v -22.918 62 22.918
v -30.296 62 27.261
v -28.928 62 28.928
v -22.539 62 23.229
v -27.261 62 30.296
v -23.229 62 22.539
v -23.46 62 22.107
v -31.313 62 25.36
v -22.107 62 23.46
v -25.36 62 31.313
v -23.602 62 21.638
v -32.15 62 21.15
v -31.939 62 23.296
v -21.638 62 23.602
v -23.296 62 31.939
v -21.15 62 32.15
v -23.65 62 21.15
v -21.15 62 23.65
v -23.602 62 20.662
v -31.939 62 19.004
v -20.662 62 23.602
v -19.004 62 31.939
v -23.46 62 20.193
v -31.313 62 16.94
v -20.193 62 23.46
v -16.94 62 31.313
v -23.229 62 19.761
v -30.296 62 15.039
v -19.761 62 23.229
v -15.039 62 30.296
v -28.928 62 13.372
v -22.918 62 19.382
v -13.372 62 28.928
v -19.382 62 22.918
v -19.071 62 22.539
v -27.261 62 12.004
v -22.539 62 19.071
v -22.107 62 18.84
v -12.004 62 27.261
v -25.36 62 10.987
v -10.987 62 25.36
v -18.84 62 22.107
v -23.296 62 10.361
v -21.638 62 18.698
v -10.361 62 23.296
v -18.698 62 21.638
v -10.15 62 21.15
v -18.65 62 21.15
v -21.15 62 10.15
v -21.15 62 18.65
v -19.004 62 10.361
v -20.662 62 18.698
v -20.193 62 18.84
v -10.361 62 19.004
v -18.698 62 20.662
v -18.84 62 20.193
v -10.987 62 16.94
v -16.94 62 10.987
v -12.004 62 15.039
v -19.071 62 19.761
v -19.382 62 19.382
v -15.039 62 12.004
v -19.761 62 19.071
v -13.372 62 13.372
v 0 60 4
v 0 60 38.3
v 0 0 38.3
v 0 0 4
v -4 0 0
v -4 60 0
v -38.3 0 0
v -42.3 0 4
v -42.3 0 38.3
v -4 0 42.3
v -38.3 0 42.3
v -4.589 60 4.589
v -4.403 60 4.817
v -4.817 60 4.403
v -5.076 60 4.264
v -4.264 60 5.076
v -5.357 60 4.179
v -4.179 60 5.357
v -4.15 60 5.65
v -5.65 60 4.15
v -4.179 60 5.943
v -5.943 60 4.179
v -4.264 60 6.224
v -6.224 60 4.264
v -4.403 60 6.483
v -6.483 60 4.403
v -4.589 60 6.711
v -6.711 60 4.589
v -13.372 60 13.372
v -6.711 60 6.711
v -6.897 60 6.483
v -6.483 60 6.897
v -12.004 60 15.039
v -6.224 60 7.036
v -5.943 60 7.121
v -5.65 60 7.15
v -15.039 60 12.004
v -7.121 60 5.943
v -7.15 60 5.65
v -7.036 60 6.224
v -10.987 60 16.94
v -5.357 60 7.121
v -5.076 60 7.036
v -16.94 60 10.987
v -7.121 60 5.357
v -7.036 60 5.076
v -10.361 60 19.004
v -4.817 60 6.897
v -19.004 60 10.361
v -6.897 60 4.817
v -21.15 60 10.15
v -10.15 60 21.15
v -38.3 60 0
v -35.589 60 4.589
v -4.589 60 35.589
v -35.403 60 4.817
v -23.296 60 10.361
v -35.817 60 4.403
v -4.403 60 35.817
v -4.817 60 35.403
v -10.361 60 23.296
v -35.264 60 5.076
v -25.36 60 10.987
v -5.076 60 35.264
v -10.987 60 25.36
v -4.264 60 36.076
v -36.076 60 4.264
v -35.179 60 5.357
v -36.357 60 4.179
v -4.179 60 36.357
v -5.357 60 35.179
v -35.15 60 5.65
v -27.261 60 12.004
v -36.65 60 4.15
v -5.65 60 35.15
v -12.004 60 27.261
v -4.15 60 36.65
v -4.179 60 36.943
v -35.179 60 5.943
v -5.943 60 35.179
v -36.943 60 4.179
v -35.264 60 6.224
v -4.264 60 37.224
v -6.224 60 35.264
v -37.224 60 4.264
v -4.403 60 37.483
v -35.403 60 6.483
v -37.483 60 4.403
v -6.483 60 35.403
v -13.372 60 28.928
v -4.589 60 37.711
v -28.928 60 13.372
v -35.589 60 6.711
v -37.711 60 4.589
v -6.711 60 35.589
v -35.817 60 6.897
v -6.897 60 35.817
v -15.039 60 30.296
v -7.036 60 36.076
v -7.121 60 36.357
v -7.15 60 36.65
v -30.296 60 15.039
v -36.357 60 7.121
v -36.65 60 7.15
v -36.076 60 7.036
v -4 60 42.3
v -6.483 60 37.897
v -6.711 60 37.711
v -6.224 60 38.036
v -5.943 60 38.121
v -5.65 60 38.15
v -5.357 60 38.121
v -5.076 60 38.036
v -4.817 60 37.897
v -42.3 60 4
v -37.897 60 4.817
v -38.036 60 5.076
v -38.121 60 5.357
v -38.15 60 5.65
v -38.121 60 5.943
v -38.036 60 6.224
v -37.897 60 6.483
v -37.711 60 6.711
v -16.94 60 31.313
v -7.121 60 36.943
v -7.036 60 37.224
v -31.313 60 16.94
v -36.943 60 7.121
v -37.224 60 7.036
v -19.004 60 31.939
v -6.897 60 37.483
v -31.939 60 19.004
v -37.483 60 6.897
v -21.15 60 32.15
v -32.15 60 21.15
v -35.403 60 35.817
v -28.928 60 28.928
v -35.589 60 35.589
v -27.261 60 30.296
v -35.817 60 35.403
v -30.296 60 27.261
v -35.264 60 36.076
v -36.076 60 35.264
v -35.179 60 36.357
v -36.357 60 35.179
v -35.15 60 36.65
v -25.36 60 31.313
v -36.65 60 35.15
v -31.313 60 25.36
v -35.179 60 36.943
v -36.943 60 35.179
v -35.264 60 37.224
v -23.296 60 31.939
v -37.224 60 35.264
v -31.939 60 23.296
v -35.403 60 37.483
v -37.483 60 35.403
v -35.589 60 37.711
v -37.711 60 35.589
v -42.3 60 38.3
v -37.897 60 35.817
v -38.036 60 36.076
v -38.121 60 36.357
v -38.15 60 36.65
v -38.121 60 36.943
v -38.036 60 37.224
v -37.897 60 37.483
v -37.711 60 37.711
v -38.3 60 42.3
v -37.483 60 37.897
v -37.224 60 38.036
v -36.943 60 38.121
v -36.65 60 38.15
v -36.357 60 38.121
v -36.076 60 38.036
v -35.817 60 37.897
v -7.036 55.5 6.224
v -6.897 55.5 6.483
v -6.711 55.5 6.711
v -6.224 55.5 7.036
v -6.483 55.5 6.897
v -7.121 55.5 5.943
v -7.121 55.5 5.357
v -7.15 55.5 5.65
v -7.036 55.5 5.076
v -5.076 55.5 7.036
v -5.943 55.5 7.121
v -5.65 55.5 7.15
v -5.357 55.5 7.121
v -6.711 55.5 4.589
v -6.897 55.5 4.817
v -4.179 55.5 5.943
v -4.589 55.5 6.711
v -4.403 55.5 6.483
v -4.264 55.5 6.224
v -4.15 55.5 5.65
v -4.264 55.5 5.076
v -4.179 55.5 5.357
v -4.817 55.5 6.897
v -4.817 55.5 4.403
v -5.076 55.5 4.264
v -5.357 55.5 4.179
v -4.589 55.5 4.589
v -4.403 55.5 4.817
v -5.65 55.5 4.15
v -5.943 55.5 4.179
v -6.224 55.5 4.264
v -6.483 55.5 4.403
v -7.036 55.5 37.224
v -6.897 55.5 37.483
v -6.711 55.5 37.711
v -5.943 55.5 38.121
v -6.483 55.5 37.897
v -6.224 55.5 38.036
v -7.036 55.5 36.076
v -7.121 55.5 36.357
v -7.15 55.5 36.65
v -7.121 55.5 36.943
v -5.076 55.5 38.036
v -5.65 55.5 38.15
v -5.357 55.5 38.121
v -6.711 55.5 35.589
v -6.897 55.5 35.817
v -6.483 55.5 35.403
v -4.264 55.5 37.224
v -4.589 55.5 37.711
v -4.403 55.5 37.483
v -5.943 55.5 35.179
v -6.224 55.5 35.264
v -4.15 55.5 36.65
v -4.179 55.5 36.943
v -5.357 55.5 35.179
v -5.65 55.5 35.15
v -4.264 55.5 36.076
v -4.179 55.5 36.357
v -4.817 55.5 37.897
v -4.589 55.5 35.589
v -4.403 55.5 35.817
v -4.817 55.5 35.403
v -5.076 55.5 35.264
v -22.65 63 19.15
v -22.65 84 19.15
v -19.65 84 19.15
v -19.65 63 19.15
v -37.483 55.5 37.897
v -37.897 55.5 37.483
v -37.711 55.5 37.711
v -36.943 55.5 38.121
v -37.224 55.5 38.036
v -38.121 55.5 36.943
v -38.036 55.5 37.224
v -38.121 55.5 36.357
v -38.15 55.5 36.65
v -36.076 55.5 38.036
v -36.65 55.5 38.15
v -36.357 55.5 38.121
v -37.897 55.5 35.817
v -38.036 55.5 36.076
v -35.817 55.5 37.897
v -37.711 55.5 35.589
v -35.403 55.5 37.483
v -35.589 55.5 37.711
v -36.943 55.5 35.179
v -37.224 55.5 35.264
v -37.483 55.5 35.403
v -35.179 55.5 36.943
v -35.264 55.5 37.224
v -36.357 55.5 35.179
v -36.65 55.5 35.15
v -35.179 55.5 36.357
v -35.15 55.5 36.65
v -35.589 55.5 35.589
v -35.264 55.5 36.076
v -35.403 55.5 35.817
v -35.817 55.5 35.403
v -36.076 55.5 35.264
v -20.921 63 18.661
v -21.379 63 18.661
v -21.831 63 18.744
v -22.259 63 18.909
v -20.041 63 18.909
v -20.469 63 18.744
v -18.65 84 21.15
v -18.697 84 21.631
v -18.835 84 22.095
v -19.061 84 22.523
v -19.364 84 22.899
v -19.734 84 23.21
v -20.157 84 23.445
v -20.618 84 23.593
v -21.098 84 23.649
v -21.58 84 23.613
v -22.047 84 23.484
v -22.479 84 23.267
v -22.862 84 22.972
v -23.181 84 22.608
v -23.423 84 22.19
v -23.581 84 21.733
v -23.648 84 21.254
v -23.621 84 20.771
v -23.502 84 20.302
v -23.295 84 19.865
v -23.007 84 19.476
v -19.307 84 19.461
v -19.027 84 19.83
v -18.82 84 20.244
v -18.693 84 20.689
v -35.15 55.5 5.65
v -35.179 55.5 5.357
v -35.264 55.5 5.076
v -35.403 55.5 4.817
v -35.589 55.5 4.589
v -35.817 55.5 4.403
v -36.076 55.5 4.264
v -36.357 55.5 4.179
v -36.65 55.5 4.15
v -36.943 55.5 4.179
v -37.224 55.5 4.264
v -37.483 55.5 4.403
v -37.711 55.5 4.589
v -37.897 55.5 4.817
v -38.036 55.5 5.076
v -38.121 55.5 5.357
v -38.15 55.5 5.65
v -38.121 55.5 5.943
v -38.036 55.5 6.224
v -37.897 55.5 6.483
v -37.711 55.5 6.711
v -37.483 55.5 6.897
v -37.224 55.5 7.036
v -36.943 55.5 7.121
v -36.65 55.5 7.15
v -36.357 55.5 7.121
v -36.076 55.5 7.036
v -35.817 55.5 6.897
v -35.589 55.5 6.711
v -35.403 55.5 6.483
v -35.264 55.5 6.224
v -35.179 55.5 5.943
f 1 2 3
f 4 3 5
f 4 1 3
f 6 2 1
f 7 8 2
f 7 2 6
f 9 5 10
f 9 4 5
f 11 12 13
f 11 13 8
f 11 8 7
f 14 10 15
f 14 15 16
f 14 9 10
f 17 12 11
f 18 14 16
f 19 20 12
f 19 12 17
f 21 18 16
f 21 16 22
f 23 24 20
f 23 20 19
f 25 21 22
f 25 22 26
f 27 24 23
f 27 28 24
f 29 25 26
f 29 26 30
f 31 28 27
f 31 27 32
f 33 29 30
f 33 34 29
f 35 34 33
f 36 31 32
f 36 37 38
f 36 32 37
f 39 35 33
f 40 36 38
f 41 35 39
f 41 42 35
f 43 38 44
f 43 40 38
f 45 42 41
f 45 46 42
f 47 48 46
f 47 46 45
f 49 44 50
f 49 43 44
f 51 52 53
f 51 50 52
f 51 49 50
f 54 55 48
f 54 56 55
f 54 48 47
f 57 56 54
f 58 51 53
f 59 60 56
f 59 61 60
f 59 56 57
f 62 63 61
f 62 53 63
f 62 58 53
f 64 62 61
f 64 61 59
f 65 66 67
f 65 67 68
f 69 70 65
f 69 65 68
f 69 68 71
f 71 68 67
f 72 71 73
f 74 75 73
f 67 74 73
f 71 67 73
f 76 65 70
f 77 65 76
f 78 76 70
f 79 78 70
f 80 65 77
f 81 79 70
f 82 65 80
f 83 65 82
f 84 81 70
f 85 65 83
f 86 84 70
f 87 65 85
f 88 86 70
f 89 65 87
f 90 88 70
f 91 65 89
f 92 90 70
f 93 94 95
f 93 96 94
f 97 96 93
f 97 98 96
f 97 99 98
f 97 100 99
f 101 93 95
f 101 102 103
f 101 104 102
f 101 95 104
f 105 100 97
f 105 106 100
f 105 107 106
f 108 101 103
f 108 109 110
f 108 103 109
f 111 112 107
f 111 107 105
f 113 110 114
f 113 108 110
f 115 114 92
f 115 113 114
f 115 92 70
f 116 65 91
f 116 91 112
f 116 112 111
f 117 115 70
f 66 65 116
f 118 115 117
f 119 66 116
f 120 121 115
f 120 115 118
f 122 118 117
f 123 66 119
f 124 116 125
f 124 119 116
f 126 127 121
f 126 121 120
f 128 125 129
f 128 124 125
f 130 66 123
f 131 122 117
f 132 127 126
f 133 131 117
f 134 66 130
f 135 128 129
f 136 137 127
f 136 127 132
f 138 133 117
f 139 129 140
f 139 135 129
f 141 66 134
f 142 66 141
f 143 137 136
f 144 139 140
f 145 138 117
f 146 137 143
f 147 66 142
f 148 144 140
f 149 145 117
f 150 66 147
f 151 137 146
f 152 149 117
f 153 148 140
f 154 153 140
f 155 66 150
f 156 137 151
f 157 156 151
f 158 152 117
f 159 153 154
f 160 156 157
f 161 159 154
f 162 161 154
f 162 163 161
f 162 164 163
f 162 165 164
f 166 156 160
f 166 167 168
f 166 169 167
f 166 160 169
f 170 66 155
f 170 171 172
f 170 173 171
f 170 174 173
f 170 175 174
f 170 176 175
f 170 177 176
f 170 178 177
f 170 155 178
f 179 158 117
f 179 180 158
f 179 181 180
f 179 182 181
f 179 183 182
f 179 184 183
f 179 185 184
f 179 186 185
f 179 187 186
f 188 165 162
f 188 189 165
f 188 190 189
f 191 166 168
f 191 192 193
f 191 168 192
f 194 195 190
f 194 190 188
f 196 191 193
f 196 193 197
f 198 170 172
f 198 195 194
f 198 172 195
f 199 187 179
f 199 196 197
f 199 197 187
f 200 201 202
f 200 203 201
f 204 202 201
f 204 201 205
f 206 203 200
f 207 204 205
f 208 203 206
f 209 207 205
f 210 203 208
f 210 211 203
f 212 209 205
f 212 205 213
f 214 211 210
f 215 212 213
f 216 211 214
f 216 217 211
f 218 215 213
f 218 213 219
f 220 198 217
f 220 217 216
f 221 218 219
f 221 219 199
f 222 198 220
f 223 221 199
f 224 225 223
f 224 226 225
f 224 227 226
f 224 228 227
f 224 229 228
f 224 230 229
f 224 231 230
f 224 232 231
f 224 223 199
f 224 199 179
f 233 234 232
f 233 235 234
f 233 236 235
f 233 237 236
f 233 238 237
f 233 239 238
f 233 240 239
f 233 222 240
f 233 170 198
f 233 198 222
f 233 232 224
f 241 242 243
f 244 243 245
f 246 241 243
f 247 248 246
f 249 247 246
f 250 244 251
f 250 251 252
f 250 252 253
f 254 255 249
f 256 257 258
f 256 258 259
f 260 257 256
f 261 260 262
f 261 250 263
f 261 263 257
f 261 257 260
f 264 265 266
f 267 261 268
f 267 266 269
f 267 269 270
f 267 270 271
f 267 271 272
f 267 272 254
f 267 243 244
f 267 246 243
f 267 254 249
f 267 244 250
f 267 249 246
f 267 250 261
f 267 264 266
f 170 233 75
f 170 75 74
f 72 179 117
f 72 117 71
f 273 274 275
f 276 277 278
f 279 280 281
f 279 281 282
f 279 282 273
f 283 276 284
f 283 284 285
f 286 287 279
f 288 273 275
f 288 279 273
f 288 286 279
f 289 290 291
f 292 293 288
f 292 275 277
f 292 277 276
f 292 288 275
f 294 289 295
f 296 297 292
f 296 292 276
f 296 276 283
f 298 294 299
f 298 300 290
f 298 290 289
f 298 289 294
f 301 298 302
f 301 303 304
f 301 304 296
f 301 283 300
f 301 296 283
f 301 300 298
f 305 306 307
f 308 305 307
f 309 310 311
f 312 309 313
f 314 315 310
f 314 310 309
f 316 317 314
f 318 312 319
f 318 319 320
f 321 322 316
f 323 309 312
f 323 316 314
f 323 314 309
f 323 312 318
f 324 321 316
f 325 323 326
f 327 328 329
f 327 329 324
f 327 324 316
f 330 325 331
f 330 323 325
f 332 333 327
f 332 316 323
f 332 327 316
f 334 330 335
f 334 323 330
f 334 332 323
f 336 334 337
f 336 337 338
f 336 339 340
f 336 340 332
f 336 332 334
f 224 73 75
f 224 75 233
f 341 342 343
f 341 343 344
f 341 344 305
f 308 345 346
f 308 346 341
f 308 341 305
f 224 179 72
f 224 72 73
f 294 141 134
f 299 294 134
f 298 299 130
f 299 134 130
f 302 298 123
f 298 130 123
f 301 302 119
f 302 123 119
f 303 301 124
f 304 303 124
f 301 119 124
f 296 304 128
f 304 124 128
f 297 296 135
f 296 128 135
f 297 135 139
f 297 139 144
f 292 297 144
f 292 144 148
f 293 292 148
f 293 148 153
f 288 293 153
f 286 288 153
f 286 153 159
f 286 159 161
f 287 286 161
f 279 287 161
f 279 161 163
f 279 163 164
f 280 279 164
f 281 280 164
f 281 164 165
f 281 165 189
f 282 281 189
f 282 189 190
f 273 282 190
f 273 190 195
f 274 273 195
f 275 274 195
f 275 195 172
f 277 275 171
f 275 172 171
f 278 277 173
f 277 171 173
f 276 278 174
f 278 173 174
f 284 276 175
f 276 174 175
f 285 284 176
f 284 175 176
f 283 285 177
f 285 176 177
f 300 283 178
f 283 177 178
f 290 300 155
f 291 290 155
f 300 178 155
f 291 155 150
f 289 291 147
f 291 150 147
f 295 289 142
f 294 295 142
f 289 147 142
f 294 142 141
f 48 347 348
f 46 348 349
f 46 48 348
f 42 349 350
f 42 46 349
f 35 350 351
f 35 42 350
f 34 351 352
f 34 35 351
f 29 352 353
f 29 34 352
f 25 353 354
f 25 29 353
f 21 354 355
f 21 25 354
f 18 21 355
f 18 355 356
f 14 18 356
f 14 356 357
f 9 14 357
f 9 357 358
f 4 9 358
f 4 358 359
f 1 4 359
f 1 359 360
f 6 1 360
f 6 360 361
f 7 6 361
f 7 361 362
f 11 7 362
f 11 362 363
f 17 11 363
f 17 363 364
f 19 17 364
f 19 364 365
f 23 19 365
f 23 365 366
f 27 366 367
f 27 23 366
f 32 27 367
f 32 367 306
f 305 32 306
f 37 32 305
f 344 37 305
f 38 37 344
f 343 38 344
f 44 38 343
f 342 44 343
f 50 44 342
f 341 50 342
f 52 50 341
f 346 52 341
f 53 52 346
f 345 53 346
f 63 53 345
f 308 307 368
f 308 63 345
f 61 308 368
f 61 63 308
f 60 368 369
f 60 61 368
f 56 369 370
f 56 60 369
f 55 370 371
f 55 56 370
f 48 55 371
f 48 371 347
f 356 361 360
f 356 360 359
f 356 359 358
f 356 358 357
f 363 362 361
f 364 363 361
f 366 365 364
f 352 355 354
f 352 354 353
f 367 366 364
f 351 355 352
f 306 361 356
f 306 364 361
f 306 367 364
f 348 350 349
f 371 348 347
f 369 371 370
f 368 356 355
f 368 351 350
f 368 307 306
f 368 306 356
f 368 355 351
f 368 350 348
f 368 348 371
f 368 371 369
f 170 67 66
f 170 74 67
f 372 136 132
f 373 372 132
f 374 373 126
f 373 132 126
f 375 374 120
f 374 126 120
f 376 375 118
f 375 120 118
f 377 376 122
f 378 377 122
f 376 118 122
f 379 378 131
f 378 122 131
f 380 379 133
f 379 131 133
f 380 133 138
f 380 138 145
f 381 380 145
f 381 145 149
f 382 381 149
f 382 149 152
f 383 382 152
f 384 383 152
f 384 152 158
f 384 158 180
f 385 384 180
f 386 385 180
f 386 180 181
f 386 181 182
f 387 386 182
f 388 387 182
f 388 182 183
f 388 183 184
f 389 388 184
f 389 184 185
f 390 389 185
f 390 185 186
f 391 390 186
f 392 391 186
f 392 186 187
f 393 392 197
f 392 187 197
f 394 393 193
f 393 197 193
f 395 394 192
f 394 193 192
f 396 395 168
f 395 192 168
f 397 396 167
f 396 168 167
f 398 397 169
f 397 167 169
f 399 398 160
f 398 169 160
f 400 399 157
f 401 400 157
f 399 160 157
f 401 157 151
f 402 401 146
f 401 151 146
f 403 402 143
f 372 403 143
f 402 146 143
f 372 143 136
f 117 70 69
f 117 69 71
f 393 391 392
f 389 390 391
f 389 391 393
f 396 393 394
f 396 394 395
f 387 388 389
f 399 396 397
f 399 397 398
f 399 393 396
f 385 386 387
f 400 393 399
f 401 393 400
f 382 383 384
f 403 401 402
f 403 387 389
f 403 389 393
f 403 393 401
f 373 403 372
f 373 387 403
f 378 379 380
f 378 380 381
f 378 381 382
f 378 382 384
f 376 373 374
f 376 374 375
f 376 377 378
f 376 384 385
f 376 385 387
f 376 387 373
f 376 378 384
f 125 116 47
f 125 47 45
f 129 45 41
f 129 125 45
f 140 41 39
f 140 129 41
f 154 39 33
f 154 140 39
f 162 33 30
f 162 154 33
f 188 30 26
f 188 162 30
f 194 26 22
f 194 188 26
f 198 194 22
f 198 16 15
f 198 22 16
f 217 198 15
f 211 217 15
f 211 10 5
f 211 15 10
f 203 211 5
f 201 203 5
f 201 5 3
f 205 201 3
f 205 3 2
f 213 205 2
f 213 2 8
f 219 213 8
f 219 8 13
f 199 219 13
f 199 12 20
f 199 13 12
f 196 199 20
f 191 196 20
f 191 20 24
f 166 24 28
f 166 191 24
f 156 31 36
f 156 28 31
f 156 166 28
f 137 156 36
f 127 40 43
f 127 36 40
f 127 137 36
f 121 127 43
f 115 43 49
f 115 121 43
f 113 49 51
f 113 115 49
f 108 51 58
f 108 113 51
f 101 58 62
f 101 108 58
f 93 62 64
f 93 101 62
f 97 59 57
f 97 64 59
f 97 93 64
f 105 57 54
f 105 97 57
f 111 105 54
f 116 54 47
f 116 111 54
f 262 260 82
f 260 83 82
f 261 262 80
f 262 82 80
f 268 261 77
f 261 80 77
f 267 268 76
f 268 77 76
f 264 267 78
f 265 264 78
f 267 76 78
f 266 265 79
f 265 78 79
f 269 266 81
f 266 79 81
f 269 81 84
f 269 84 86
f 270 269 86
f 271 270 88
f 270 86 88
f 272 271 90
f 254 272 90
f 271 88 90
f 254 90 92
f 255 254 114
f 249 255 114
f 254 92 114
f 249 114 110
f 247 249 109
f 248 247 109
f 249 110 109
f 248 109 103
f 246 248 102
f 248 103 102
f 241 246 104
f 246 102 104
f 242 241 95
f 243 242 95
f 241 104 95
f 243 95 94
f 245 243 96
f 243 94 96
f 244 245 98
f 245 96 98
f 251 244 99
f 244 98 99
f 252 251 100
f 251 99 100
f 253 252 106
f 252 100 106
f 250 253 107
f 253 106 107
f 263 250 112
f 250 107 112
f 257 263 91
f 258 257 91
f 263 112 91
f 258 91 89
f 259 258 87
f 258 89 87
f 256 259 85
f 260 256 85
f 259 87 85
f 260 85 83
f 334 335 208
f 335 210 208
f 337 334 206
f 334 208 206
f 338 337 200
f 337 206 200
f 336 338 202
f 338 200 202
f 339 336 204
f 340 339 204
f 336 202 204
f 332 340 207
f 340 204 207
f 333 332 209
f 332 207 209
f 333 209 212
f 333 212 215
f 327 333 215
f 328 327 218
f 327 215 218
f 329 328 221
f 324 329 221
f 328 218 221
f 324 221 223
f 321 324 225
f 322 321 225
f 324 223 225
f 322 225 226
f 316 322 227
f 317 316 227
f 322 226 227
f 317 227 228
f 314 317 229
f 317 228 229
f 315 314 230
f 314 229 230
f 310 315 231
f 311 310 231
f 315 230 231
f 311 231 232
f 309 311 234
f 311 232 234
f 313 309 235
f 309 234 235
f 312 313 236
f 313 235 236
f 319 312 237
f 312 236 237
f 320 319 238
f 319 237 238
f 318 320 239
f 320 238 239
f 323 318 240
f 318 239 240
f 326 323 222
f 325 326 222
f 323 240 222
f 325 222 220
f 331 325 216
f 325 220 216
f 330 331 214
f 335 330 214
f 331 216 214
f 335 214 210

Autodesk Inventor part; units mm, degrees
ref_plane "YZ Plane" through (0, 0, 0) normal (1, 0, 0) x (0, 1, 0)
ref_plane "XZ Plane" through (0, 0, 0) normal (0, 1, 0) x (-1, 0, 0)
ref_plane "XY Plane" through (0, 0, 0) normal (0, 0, 1) x (1, 0, 0)
sketch "Sketch1" plane through (0, 0, 0) normal (0, 1, 0) x (-1, 0, 0)
  line L0 (0, 0) -> (42.3, 0)
  line L1 (42.3, 0) -> (42.3, 42.3)
  line L2 (42.3, 42.3) -> (0, 42.3)
  line L3 (0, 42.3) -> (0, 0)
  dimension "d0" = 42.3
  dimension "d1" = 42.3
extrude "Extrusion1" add sketch "Sketch1" along normal blind 60
sketch "Sketch2" plane through (0, 60, 0) normal (0, 1, 0) x (1, 0, 0)
  line L0 (0, 0) -> (-42.3, 0) projected
  line L1 (0, -42.3) -> (0, 0) projected
  circle A0 centre (-21.15, -21.15) radius 11
  point P0 (0, -2)
  point P1 (-2, 0)
  point P2 (-40.3, 0)
  point P3 (0, -40.3)
  dimension "d6" = 22
  dimension "d7" = 21.15
  dimension "d8" = 21.15
extrude "Extrusion2" add sketch "Sketch2" along normal blind 2
sketch "Sketch3" plane through (-21.15, 62, 21.15) normal (0, 1, 0) x (1, 0, 0)
  circle A0 centre (0, 0) radius 11 projected
  circle A1 centre (0, 0) radius 2.5
  point P0 (21.15, 21.15)
  dimension "d11" = 5
extrude "Extrusion3" add sketch "Sketch3" along normal blind 22 contours A1
sketch "Sketch4" plane through (-21.15, 84, 21.15) normal (0, 1, 0) x (1, 0, 0)
  circle A0 centre (0, 0) radius 2.5 projected
  line L0 (-1.5, 2) -> (1.5, 2)
  point P0 (21.15, 21.15)
  dimension "d14" = 2
extrude "Extrusion4" cut sketch "Sketch4" against normal blind 21 contours L0 A0 picked at (-0.3466, 2.0912)
sketch "Sketch5" plane through (0, 60, 0) normal (0, 1, 0) x (1, 0, 0)
  line L0 (-42.3, 0) -> (-42.3, -42.3) projected
  line L1 (-42.3, -42.3) -> (0, -42.3) projected
  circle A0 centre (-36.65, -5.65) radius 1.5
  circle A1 centre (-5.65, -5.65) radius 1.5
  circle A2 centre (-5.65, -36.65) radius 1.5
  circle A3 centre (-36.65, -36.65) radius 1.5
  point P0 (-42.3, -2)
  point P1 (-42.3, -40.3)
  point P2 (-40.3, -42.3)
  point P3 (-2, -42.3)
  point P4 (0, 0)
  dimension "d17" = 3
  dimension "d18" = 3
  dimension "d19" = 3
  dimension "d20" = 3
  dimension "d21" = 31
  dimension "d22" = 5.65
  dimension "d23" = 31
  dimension "d24" = 5.65
extrude "Extrusion5" cut sketch "Sketch5" against normal blind 4.5
chamfer "Chamfer1" distance 4 angle 45 4 edges at (-42.3, 30, 0) (-42.3, 30, 42.3) (0, 30, 0) (0, 30, 42.3)
properties part number "StepperMotorNema17"
